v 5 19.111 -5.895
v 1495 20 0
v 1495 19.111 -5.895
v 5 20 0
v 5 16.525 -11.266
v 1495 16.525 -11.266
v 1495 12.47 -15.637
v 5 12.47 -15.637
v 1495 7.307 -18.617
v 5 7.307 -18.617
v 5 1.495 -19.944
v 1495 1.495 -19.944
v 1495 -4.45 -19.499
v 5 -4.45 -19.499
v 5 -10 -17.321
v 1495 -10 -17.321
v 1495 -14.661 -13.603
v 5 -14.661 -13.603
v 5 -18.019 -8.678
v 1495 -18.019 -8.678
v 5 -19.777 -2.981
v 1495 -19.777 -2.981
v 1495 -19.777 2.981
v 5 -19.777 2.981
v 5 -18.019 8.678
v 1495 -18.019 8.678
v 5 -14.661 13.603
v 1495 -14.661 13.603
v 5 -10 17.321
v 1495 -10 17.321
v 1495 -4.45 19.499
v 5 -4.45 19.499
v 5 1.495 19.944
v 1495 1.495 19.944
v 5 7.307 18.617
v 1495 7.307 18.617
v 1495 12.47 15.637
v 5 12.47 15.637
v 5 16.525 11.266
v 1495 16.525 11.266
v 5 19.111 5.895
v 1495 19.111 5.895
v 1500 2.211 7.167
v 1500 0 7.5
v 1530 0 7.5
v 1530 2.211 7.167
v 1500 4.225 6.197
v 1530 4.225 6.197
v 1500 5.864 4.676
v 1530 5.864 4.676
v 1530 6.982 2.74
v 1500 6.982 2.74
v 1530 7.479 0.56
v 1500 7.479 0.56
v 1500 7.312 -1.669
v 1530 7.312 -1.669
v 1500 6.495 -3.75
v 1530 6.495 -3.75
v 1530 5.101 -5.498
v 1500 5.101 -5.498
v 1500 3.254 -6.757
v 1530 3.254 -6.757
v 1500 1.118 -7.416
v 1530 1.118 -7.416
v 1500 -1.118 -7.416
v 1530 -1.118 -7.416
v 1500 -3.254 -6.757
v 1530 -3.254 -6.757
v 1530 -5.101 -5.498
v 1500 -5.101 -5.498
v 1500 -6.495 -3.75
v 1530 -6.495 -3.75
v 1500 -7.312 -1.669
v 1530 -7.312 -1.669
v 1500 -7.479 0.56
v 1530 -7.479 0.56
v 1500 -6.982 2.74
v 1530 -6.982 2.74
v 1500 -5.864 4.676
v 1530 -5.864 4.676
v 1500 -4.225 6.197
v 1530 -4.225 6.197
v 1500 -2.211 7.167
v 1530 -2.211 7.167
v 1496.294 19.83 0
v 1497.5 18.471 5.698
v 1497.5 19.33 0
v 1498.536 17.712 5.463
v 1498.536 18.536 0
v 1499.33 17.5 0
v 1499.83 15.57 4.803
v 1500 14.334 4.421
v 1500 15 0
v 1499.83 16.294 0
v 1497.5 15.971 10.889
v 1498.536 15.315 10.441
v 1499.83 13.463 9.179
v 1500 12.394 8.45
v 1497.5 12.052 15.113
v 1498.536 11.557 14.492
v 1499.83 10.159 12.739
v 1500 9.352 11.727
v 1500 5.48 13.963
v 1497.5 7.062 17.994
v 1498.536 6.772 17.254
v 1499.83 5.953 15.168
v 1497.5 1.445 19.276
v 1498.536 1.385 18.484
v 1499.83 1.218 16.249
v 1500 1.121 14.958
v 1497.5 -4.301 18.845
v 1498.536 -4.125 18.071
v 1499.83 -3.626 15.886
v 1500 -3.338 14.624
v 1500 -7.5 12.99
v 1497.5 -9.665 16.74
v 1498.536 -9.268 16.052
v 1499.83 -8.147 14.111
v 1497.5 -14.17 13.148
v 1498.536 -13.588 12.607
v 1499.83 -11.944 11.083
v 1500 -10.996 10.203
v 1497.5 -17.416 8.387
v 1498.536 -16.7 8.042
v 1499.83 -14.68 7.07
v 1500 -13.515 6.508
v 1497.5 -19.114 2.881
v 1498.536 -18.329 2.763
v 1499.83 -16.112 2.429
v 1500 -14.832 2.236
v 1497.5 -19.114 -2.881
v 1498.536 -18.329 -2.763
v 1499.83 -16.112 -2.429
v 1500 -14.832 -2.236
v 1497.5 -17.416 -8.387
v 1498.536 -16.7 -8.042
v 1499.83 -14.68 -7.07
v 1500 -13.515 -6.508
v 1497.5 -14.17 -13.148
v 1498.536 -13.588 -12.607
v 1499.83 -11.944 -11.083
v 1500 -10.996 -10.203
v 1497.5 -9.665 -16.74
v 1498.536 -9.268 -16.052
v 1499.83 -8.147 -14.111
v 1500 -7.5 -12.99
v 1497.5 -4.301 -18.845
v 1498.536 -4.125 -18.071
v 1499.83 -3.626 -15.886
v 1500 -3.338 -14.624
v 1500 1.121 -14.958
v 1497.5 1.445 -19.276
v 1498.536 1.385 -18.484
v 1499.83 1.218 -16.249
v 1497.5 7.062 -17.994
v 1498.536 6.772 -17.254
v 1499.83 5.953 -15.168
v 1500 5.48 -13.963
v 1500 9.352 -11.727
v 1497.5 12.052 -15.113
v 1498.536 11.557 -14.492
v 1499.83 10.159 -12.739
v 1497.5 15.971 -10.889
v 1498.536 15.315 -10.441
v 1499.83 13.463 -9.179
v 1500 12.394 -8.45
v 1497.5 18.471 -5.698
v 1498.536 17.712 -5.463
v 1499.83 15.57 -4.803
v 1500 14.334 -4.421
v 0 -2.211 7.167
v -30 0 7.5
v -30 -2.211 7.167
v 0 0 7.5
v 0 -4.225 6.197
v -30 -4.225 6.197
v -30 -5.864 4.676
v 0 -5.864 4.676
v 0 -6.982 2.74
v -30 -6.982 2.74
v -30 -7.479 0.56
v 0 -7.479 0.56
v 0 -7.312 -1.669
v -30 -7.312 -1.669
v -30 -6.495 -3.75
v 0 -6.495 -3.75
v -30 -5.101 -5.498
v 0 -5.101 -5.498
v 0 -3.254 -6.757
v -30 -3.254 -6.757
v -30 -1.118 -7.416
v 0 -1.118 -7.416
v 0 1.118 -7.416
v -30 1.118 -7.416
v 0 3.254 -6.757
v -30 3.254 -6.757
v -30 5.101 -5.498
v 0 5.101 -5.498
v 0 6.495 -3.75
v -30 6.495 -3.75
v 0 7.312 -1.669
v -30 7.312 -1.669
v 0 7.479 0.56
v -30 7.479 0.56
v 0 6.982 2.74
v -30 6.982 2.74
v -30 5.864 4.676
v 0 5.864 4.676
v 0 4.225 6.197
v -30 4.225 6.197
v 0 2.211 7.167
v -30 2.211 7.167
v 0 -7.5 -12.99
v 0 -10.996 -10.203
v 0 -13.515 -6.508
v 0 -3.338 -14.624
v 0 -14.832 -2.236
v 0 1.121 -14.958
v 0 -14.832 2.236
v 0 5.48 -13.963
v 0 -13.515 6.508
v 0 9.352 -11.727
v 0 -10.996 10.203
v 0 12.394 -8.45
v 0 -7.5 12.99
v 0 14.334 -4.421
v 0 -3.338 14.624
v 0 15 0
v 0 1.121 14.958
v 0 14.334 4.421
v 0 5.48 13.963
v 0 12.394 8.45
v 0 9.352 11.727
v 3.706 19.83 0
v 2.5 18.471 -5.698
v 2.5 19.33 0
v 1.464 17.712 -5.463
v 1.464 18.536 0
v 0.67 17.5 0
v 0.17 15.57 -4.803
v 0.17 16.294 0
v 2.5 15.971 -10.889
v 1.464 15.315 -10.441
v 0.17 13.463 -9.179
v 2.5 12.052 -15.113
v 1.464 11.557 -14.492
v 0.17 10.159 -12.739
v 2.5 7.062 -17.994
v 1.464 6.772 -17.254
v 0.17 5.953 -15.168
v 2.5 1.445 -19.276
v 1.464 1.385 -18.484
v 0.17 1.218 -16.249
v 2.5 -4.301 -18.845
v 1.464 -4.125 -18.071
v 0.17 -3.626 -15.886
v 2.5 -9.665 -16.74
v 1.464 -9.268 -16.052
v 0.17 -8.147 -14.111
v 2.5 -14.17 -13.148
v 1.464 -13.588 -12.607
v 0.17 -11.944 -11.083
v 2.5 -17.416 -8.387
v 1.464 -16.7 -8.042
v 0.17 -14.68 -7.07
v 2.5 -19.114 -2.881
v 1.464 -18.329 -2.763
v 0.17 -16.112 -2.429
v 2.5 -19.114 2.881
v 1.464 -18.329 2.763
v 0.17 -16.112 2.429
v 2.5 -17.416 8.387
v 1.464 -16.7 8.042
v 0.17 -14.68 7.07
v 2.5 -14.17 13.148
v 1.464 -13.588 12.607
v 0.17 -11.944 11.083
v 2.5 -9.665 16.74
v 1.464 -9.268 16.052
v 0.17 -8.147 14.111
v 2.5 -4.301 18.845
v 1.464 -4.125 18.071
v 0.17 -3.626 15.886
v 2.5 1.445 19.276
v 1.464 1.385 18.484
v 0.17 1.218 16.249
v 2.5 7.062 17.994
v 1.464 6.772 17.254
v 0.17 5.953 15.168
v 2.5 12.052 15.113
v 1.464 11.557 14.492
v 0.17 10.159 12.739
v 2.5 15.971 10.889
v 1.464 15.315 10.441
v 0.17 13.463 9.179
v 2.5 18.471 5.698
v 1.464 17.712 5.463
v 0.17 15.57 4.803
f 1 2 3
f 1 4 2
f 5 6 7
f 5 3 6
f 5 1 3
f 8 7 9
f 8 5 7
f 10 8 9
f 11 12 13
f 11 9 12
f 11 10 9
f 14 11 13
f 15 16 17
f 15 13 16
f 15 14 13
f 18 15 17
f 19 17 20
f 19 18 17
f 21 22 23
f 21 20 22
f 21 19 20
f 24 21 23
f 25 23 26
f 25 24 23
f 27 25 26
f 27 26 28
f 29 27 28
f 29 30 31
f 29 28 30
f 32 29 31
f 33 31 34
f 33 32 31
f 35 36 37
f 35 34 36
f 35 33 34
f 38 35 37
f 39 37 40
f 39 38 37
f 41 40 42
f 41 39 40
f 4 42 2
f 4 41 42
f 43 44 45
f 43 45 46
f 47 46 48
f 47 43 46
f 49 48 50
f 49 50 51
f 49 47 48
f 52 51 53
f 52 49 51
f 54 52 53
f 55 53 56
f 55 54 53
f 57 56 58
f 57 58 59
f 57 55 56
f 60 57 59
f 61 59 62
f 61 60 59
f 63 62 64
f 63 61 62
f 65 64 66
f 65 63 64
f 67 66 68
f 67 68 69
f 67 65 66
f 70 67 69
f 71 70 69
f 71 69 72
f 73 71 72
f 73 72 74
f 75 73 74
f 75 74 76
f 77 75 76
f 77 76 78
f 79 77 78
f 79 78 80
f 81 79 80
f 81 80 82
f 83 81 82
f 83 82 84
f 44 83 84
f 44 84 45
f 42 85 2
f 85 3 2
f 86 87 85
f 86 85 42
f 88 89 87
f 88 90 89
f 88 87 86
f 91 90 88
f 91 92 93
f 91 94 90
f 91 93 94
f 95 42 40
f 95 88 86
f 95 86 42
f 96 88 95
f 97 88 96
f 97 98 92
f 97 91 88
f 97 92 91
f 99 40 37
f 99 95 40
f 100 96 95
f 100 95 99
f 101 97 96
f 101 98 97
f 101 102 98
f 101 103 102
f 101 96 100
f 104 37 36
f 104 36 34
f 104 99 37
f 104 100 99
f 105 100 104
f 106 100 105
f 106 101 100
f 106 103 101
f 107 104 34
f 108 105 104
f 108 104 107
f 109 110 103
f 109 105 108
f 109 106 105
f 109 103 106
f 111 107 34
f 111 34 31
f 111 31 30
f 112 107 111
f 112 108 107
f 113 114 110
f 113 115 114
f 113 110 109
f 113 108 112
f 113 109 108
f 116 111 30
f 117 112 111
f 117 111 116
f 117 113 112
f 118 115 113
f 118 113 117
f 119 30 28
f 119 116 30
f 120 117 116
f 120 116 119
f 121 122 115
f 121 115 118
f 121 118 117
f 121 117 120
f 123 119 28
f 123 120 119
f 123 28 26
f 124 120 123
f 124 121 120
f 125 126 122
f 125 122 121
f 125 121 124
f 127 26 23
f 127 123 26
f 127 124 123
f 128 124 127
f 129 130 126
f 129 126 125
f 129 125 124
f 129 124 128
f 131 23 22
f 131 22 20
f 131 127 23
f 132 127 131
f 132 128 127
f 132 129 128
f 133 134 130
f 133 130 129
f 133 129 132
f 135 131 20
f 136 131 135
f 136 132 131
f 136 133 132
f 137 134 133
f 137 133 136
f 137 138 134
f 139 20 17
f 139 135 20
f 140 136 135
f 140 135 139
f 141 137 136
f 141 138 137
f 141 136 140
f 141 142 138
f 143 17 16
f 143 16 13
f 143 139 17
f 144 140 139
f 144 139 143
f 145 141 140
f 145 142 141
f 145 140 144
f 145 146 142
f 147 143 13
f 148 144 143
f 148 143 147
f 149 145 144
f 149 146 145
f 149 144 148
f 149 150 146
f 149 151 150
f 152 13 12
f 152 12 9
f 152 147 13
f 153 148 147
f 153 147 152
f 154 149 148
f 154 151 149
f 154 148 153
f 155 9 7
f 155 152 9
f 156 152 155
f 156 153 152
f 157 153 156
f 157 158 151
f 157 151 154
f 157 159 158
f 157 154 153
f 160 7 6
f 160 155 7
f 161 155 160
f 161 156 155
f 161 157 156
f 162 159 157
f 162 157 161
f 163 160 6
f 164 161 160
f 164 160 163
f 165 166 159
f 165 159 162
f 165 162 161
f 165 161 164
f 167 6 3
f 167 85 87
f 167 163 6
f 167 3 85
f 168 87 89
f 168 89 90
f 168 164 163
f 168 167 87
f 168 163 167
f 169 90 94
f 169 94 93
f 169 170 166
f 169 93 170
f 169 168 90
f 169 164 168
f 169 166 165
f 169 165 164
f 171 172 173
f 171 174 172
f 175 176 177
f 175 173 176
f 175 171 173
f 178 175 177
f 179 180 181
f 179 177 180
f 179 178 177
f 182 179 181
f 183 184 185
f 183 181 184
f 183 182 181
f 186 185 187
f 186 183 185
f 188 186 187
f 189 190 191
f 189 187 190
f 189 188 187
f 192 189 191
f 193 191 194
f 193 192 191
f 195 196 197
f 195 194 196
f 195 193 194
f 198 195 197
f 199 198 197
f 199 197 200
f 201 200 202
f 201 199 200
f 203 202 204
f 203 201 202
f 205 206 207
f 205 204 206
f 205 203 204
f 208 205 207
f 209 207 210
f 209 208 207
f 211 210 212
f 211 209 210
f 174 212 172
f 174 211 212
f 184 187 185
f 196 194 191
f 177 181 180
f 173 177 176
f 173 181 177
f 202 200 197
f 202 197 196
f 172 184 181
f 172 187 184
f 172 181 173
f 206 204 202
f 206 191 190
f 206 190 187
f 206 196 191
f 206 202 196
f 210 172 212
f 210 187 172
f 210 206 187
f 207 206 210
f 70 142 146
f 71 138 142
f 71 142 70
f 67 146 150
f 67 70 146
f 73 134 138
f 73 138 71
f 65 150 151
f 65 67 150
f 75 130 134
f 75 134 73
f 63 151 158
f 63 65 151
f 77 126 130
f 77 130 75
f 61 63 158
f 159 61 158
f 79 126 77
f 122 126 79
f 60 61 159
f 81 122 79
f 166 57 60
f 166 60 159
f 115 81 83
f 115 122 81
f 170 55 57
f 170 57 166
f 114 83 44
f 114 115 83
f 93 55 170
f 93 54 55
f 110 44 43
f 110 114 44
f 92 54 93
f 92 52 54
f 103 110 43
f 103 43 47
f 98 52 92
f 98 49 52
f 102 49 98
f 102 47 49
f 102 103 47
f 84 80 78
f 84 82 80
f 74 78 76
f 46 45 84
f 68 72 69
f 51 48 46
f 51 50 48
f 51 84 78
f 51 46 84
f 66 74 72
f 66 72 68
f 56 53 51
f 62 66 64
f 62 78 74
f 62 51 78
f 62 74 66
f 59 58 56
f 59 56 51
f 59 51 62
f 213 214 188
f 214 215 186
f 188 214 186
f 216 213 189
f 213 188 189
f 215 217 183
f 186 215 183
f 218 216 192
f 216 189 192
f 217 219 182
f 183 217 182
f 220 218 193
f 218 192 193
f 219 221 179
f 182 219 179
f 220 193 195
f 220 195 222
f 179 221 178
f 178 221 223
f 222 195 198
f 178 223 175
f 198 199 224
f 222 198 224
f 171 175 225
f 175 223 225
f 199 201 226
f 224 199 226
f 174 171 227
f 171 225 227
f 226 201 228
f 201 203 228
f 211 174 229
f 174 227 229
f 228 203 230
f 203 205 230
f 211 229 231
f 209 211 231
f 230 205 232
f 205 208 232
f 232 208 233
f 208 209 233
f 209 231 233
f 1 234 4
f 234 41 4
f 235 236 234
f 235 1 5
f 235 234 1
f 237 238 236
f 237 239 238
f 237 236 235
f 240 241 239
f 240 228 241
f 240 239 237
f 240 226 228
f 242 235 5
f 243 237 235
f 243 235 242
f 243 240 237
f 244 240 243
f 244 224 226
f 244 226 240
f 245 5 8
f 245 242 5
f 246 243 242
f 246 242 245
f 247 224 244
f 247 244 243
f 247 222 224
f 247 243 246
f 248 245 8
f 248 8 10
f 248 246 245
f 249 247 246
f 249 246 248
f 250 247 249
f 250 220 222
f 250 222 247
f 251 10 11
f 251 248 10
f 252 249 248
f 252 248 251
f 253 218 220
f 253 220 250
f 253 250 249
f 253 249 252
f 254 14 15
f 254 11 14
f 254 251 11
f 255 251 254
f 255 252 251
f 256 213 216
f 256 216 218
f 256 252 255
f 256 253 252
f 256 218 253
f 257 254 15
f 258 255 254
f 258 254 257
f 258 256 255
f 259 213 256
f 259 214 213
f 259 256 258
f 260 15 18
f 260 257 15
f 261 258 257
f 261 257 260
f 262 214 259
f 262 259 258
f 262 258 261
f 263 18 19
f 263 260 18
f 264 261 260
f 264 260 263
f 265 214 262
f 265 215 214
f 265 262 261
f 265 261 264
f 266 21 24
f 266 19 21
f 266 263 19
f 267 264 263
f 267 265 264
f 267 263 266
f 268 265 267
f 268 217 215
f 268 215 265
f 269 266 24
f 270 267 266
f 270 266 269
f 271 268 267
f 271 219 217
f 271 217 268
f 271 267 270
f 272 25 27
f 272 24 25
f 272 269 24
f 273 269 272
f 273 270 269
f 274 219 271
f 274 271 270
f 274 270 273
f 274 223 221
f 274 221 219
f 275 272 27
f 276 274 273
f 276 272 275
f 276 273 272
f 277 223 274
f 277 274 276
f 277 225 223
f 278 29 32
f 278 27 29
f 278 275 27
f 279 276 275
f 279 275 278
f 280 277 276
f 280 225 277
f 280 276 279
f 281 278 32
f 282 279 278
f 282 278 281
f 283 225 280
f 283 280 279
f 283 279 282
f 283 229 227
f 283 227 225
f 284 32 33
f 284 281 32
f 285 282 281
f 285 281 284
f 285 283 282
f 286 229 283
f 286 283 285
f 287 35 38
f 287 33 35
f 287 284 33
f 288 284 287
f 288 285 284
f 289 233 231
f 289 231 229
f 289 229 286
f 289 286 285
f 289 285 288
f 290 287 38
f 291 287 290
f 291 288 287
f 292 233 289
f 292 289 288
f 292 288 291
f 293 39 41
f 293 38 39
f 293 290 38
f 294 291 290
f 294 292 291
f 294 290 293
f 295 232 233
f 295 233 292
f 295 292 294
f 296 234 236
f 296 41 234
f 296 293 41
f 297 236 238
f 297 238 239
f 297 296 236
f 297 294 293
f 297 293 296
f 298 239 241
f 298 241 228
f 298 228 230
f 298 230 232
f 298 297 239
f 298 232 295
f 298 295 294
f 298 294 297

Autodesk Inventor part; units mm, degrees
ref_plane "YZ Plane" through (0, 0, 0) normal (1, 0, 0) x (0, 1, 0)
ref_plane "XZ Plane" through (0, 0, 0) normal (0, 1, 0) x (-1, 0, 0)
sketch "Sketch1" plane through (0, 0, 0) normal (1, 0, 0) x (0, 1, 0)
  circle A0 centre (0, 0) radius 20
  dimension "d0" = 40
extrude "Extrusion1" add sketch "Sketch1" along normal blind 1500
fillet "Fillet1" radius 5 1 edges at (0, -20, 0)
sketch "Sketch2" plane through (0, 0, 0) normal (-1, 0, 0) x (0, 0, 1)
  circle A0 centre (0, 0) radius 7.5
  dimension "d4" = 15
extrude "Extrusion2" add sketch "Sketch2" along normal blind 30
ref_plane "Work Plane1" through (750, 0, 0) normal (1, 0, 0) x (0, 0, -1)
mirror "Mirror1" about plane through (750, 0, 0) normal (1, 0, 0) of "Fillet1", "Extrusion2"
properties part number "CR-1500"
